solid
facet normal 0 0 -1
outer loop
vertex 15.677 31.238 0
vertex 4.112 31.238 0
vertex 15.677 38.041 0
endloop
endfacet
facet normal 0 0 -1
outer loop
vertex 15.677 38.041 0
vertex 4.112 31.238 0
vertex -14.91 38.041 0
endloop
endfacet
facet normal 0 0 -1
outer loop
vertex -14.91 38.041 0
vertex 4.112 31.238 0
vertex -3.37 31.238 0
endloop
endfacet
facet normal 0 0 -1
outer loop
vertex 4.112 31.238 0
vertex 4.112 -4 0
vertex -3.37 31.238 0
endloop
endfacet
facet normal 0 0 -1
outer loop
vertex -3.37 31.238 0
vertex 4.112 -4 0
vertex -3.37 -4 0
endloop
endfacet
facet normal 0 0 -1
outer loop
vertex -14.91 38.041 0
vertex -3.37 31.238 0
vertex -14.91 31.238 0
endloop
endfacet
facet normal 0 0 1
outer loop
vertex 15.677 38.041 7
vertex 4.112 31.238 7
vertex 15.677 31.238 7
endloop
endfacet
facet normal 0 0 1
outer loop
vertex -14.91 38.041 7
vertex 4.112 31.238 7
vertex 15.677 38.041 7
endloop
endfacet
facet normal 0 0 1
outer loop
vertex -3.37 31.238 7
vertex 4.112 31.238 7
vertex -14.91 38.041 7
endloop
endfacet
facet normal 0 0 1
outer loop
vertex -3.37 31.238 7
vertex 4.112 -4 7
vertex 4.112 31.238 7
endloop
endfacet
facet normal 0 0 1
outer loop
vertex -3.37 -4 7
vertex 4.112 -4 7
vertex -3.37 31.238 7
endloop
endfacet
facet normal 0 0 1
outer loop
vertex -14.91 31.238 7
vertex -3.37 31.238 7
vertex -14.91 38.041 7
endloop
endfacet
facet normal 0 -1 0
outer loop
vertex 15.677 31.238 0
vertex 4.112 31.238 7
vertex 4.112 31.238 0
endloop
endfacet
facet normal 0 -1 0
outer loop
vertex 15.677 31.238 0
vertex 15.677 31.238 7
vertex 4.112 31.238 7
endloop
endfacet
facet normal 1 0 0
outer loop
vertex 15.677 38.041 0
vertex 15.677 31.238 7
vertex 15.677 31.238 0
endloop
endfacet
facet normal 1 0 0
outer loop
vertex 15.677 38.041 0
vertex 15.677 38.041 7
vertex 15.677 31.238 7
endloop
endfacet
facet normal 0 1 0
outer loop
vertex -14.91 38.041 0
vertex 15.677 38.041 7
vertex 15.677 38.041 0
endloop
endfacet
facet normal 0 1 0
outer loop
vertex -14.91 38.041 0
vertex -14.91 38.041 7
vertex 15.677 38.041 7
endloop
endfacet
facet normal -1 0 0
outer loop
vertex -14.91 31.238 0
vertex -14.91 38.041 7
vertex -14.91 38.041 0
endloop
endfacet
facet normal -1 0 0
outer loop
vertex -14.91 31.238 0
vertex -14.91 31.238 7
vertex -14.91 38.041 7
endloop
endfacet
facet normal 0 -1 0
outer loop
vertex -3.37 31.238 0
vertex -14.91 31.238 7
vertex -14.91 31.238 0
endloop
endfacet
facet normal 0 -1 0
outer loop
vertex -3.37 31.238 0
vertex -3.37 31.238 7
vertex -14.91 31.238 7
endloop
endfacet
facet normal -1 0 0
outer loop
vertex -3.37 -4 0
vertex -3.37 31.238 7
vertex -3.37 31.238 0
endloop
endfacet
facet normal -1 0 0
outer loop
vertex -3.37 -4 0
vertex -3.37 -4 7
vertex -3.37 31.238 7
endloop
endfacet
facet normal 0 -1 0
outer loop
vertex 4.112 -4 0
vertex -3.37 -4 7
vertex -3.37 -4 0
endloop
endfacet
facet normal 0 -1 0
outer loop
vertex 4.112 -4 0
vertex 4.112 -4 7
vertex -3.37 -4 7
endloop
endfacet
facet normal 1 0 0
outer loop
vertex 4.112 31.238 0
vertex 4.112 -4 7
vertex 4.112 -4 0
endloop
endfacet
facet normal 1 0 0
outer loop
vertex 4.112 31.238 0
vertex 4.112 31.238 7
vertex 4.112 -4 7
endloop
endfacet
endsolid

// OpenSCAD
// file: glyph.scad
// glyph — the shared geometry of every letter in the set. Defines named geometry
// only, so it renders nothing on its own; each letter part includes it and calls
// letter(). Every dimension lives in ../../lib/common.scad.
//
// A LETTER IS NOTHING BUT A LETTER. No plinth, no tongue, no tab — it is the
// bare glyph, and it attaches by standing in the deck groove and resting on the
// groove's floor. Anything else on it would be a distraction on a learning toy.
//
// It is a flat plate of one thickness, printed face-down: no overhang anywhere,
// no supports, and the face on the bed comes out smoothest.
//
// TWO TRAPS WITH text():
//
//  * A missing font FALLS BACK SILENTLY — no warning, no error, just different
//    letters. "Liberation Sans" was the first choice here because OpenSCAD
//    bundles it; on macOS the bundled faces are not registered with fontconfig,
//    so it rendered the fallback face instead and nothing said so. To check a
//    font resolved, render a string with it and with a deliberately bogus name
//    and compare bounding boxes: identical means it fell back.
//  * `size` is not the cap height in general. For Helvetica Bold they coincide
//    (size 44 -> 44.0 mm cap), which is why letter_size reads as a height.
//    Change the font and re-measure.

include <../../lib/common.scad>

// The letter's outline, upright in the XY plane, ready to be extruded along Z
// (which is the letter's thickness, and the print's build axis).
//
//   y = 0   is the deck surface
//   y < 0   is the part standing down inside the groove. It reaches letter_bury,
//           which is where the tapered groove closes to letter_t — NOT the
//           groove's floor. The letter wedges; it never bottoms out.
module glyph_2d(ch) {
    intersection() {
        translate([0, -letter_bury])
            scale([letter_condense, 1])
                text(ch, size = letter_size, font = letter_font,
                     halign = "center", valign = "baseline");
        // Trimmed flat at the baseline. Round letters (O, C, G, S) overshoot the
        // baseline by design, and a letter standing on a convex curve rocks —
        // there is nothing to stop it leaning. The trim costs nothing visible
        // and gives every letter a flat foot on the groove floor.
        translate([-200, -letter_bury]) square([400, 400]);
    }
}

// One letter, in its print orientation: lying on its face, thickness up Z.
module letter(ch) {
    linear_extrude(letter_t) glyph_2d(ch);
}

// Where that letter sits once it is dropped into a chassis, for fit checks.
module letter_fitted(ch) {
    translate([0, letter_t/2, body_top]) rotate([90, 0, 0]) letter(ch);
}
// main file
// letter T — one part. See glyph.scad for the geometry and lib/common.scad for
// the dimensions. Prints lying on its face, exactly as exported: no supports.

include <glyph.scad>

letter("T");
